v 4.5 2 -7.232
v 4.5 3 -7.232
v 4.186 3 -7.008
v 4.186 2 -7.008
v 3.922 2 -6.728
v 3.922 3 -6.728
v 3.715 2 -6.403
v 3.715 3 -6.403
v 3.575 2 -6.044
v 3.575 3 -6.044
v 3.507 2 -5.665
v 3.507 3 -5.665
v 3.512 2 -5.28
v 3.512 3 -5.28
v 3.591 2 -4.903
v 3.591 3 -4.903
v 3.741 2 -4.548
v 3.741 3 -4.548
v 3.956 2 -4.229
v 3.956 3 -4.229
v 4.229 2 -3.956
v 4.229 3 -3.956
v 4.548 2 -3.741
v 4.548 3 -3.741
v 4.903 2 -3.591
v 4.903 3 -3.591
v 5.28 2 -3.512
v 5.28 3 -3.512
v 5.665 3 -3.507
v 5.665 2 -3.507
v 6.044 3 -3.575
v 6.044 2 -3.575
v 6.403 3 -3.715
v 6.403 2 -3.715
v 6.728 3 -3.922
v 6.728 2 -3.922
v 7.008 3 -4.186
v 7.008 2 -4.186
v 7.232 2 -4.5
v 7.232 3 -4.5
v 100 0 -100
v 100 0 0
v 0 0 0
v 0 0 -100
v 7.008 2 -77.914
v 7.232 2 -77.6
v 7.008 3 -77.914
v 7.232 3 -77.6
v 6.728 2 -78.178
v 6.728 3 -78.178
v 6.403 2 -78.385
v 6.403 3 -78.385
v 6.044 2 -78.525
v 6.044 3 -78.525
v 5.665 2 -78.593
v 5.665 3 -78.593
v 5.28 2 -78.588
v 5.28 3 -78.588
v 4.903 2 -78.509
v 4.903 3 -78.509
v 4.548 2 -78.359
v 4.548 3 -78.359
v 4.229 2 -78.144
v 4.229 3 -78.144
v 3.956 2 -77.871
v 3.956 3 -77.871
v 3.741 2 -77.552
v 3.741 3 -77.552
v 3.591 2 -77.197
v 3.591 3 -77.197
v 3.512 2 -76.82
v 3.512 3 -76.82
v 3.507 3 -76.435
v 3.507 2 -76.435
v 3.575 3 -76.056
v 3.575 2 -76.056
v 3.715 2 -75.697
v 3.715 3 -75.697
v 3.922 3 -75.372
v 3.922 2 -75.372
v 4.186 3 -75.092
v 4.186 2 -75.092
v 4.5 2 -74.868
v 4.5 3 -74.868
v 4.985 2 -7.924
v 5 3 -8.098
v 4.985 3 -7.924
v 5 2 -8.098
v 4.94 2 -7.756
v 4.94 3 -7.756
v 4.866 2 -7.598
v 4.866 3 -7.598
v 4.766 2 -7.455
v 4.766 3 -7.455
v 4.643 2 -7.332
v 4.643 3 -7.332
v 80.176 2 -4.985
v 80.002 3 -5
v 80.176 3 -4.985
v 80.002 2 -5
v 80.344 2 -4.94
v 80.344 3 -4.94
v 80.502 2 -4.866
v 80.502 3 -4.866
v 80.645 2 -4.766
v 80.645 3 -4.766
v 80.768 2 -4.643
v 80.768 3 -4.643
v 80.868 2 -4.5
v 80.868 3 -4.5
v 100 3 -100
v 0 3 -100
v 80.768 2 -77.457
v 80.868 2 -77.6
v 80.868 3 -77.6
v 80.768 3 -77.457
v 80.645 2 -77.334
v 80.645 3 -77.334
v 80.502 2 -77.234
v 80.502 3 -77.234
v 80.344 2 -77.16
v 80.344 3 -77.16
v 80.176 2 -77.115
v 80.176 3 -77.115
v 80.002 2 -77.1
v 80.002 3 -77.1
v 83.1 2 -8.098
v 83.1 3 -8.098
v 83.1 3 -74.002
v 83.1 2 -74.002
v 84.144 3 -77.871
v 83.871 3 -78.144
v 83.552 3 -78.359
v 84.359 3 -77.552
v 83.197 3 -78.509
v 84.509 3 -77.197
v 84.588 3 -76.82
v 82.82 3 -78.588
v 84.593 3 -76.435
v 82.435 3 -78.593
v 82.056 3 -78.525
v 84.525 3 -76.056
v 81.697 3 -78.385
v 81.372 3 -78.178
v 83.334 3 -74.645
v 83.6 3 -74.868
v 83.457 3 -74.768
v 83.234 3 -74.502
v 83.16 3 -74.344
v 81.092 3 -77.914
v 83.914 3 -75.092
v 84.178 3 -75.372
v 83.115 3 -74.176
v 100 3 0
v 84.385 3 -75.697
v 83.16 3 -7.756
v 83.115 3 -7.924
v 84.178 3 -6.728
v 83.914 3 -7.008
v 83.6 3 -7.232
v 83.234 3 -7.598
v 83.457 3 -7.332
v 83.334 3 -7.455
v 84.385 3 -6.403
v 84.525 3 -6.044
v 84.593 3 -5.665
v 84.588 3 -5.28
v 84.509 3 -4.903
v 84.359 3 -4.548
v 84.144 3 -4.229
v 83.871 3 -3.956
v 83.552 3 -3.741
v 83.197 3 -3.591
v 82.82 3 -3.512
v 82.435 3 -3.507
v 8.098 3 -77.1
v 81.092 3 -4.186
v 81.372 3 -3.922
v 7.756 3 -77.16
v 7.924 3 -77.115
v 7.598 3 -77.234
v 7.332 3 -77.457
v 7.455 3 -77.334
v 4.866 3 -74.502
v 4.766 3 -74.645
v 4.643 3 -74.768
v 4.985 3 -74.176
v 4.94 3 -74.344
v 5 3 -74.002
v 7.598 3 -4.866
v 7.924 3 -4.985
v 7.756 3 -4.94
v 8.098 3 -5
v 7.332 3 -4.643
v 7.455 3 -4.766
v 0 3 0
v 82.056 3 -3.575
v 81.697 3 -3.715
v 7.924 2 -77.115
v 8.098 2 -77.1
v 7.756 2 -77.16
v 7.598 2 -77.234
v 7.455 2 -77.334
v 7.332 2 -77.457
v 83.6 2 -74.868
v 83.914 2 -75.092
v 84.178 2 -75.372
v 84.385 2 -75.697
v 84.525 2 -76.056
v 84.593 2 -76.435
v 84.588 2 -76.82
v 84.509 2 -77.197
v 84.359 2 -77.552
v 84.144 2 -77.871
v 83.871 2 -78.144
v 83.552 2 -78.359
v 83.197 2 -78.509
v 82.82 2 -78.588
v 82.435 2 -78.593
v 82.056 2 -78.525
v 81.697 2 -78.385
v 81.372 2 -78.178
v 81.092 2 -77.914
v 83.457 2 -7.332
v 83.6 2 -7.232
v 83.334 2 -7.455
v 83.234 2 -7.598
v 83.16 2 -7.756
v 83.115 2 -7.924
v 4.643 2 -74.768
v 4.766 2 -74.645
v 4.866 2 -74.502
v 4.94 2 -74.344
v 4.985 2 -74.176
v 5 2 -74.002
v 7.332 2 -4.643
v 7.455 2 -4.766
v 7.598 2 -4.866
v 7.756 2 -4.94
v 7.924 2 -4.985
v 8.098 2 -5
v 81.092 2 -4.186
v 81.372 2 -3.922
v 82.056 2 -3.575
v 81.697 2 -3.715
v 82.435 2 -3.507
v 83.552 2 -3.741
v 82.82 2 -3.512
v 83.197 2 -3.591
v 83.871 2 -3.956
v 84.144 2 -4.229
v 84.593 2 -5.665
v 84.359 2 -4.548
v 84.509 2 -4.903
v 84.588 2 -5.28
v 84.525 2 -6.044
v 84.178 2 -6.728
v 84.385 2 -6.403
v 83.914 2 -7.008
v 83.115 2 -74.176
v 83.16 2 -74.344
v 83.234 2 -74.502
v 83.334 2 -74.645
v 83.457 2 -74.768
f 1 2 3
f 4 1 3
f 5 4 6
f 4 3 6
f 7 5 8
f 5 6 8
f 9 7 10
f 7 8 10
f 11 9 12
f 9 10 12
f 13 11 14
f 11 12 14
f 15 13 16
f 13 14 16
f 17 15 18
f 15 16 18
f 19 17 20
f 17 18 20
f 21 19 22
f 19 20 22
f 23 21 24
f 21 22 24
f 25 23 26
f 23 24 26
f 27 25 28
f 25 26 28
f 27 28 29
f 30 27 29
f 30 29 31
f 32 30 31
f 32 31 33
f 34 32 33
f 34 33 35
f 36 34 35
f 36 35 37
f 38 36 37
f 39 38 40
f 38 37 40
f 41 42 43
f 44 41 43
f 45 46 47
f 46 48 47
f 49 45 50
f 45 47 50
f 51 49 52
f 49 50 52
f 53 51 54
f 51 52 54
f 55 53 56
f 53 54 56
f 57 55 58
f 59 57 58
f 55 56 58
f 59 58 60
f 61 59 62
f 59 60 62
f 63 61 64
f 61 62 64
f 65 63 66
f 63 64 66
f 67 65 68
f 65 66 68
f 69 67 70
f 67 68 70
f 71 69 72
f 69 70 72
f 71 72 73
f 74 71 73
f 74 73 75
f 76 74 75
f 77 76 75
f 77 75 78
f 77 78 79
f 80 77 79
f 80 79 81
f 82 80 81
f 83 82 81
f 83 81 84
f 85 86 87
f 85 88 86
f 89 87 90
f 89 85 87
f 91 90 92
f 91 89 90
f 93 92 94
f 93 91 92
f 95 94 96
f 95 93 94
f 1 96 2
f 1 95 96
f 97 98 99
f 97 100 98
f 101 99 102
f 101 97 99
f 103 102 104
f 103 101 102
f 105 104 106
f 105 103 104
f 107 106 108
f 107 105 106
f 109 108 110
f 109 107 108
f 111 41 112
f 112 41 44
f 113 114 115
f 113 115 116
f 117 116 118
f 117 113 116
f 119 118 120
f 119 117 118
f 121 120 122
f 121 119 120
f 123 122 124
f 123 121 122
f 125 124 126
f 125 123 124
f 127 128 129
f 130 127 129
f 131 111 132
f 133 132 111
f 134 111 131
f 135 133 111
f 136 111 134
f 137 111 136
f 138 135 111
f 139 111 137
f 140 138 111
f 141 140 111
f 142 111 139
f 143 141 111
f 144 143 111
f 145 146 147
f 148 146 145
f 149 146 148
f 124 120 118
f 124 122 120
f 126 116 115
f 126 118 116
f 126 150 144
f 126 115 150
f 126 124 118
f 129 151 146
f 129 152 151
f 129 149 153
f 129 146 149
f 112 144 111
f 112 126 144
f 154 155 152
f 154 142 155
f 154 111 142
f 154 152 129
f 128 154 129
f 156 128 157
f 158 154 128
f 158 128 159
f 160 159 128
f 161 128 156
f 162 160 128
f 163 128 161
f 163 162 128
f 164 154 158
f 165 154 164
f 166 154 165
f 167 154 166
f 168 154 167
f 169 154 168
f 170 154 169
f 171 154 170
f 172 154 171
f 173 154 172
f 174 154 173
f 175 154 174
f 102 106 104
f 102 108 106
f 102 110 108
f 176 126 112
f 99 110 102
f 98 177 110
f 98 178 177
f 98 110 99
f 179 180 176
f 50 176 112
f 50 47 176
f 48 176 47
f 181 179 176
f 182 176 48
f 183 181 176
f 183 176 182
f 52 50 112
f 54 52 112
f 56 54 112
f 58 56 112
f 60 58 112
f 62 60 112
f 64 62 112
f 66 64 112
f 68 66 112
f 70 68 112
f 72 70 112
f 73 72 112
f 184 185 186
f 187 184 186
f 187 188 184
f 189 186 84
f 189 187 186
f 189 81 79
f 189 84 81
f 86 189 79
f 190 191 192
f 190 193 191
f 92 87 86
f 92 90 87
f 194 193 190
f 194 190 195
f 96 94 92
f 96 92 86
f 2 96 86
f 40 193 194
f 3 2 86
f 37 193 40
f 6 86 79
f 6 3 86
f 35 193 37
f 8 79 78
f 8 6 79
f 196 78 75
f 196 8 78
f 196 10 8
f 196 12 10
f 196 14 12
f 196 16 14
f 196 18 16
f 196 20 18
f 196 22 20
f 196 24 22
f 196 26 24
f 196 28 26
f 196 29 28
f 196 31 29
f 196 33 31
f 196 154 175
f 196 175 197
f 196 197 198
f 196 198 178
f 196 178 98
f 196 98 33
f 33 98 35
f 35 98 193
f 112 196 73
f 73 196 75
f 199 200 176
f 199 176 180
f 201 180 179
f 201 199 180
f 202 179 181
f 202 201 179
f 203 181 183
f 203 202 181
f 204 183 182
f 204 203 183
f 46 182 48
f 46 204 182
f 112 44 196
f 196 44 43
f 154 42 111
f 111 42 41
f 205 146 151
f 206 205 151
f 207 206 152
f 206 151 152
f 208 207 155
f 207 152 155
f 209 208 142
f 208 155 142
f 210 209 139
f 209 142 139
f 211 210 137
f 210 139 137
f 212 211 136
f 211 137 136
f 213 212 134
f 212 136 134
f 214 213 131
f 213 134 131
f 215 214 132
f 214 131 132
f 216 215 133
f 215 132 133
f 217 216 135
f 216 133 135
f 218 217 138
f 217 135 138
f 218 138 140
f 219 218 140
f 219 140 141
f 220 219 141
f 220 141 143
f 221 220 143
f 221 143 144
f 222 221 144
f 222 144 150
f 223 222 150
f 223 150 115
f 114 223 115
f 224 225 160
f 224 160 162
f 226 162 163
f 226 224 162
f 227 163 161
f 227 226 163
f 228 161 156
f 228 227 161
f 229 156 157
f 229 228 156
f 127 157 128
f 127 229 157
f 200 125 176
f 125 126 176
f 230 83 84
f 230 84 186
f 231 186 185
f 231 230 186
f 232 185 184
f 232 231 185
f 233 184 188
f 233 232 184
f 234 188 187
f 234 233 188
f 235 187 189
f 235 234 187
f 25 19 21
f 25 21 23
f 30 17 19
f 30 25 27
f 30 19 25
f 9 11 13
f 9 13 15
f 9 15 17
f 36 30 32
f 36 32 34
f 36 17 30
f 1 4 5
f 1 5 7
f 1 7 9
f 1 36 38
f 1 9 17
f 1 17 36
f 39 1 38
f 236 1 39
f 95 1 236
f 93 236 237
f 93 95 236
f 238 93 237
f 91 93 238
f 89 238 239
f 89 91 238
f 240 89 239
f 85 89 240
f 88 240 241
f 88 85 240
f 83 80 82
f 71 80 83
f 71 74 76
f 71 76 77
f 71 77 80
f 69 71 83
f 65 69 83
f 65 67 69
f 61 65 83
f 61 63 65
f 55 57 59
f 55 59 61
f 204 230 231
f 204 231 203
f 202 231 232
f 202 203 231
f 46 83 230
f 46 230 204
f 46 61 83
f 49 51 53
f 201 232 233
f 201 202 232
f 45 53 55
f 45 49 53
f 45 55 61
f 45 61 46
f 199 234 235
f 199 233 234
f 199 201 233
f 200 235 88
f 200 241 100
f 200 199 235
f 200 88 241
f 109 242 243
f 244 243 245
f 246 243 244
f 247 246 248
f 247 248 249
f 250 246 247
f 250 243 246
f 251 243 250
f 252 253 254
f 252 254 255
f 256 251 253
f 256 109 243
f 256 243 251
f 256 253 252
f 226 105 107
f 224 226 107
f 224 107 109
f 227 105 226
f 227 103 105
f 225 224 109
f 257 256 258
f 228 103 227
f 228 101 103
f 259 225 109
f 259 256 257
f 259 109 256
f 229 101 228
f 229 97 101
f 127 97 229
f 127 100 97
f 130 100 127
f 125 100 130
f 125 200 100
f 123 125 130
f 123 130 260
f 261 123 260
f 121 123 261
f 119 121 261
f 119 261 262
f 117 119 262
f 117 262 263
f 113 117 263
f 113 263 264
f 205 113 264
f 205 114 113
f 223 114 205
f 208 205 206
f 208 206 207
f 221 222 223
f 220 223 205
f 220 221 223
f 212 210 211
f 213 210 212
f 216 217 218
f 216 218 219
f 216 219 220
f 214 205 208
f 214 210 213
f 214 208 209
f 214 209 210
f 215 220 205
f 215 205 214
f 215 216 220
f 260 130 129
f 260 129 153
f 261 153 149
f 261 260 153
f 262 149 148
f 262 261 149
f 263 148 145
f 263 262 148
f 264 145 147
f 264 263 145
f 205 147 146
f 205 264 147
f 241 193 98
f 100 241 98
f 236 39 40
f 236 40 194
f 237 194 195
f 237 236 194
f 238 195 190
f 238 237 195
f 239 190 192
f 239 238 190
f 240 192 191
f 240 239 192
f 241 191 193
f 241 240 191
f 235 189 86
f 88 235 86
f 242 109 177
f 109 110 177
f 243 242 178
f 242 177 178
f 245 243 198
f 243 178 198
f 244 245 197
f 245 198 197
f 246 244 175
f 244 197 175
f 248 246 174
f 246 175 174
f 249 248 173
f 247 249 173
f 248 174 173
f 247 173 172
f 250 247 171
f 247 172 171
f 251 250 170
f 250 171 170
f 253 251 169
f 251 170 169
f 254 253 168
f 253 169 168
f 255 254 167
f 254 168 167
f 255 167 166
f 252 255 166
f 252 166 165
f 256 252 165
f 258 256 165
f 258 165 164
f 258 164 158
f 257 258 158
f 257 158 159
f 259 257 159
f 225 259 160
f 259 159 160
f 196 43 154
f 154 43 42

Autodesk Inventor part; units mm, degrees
ref_plane "YZ Plane" through (0, 0, 0) normal (1, 0, 0) x (0, 1, 0)
ref_plane "XZ Plane" through (0, 0, 0) normal (0, 1, 0) x (-1, 0, 0)
ref_plane "XY Plane" through (0, 0, 0) normal (0, 0, 1) x (1, 0, 0)
sketch "Sketch1" plane through (0, 0, 0) normal (0, 1, 0) x (-1, 0, 0)
  line L0 (0, 0) -> (-100, 0)
  line L1 (-100, 0) -> (-100, -100)
  line L2 (-100, -100) -> (0, -100)
  line L3 (0, -100) -> (0, 0)
  dimension "d0" = 100
  dimension "d1" = 100
extrude "Extrusion1" add sketch "Sketch1" along normal blind 3
sketch "Sketch2" plane through (0, 3, 0) normal (0, 1, 0) x (1, 0, 0)
  line L0 (5, 5) -> (83.1, 5)
  line L1 (83.1, 5) -> (83.1, 77.1)
  line L2 (83.1, 77.1) -> (5, 77.1)
  line L3 (5, 77.1) -> (5, 5)
  line L4 (0, 0) -> (100, 0) projected
  line L5 (0, 100) -> (0, 0) projected
  arc A0 (5, 7.4365) -> (7.4365, 5) centre (5.5, 5.5) ccw
  line L6 (44.05, 77.1) -> (44.05, 5) construction
  line L7 (5, 41.05) -> (83.1, 41.05) construction
  arc A1 (80.6635, 5) -> (83.1, 7.4365) centre (82.6, 5.5) ccw
  arc A2 (7.4365, 77.1) -> (5, 74.6635) centre (5.5, 76.6) ccw
  arc A3 (83.1, 74.6635) -> (80.6635, 77.1) centre (82.6, 76.6) ccw
  point P0 (80.6635, 5)
  point P1 (83.1, 7.4365)
  point P2 (83.1, 74.6635)
  point P3 (80.6635, 77.1)
  point P4 (7.4365, 77.1)
  point P5 (5, 74.6635)
  dimension "d4" = 78.1
  dimension "d5" = 72.1
  dimension "d6" = 5
  dimension "d7" = 5
  dimension "d10" = 0.5
  dimension "d11" = 0.5
  dimension "d12" = 2
extrude "Extrusion2" cut sketch "Sketch2" against normal blind 1
fillet "Fillet1" radius 1 8 edges at (5, 2.5, -7.4365) (7.4365, 2.5, -5) (83.1, 2.5, -7.4365) (80.6635, 2.5, -5) (83.1, 2.5, -74.6635) (80.6635, 2.5, -77.1) (7.4365, 2.5, -77.1) (5, 2.5, -74.6635)
